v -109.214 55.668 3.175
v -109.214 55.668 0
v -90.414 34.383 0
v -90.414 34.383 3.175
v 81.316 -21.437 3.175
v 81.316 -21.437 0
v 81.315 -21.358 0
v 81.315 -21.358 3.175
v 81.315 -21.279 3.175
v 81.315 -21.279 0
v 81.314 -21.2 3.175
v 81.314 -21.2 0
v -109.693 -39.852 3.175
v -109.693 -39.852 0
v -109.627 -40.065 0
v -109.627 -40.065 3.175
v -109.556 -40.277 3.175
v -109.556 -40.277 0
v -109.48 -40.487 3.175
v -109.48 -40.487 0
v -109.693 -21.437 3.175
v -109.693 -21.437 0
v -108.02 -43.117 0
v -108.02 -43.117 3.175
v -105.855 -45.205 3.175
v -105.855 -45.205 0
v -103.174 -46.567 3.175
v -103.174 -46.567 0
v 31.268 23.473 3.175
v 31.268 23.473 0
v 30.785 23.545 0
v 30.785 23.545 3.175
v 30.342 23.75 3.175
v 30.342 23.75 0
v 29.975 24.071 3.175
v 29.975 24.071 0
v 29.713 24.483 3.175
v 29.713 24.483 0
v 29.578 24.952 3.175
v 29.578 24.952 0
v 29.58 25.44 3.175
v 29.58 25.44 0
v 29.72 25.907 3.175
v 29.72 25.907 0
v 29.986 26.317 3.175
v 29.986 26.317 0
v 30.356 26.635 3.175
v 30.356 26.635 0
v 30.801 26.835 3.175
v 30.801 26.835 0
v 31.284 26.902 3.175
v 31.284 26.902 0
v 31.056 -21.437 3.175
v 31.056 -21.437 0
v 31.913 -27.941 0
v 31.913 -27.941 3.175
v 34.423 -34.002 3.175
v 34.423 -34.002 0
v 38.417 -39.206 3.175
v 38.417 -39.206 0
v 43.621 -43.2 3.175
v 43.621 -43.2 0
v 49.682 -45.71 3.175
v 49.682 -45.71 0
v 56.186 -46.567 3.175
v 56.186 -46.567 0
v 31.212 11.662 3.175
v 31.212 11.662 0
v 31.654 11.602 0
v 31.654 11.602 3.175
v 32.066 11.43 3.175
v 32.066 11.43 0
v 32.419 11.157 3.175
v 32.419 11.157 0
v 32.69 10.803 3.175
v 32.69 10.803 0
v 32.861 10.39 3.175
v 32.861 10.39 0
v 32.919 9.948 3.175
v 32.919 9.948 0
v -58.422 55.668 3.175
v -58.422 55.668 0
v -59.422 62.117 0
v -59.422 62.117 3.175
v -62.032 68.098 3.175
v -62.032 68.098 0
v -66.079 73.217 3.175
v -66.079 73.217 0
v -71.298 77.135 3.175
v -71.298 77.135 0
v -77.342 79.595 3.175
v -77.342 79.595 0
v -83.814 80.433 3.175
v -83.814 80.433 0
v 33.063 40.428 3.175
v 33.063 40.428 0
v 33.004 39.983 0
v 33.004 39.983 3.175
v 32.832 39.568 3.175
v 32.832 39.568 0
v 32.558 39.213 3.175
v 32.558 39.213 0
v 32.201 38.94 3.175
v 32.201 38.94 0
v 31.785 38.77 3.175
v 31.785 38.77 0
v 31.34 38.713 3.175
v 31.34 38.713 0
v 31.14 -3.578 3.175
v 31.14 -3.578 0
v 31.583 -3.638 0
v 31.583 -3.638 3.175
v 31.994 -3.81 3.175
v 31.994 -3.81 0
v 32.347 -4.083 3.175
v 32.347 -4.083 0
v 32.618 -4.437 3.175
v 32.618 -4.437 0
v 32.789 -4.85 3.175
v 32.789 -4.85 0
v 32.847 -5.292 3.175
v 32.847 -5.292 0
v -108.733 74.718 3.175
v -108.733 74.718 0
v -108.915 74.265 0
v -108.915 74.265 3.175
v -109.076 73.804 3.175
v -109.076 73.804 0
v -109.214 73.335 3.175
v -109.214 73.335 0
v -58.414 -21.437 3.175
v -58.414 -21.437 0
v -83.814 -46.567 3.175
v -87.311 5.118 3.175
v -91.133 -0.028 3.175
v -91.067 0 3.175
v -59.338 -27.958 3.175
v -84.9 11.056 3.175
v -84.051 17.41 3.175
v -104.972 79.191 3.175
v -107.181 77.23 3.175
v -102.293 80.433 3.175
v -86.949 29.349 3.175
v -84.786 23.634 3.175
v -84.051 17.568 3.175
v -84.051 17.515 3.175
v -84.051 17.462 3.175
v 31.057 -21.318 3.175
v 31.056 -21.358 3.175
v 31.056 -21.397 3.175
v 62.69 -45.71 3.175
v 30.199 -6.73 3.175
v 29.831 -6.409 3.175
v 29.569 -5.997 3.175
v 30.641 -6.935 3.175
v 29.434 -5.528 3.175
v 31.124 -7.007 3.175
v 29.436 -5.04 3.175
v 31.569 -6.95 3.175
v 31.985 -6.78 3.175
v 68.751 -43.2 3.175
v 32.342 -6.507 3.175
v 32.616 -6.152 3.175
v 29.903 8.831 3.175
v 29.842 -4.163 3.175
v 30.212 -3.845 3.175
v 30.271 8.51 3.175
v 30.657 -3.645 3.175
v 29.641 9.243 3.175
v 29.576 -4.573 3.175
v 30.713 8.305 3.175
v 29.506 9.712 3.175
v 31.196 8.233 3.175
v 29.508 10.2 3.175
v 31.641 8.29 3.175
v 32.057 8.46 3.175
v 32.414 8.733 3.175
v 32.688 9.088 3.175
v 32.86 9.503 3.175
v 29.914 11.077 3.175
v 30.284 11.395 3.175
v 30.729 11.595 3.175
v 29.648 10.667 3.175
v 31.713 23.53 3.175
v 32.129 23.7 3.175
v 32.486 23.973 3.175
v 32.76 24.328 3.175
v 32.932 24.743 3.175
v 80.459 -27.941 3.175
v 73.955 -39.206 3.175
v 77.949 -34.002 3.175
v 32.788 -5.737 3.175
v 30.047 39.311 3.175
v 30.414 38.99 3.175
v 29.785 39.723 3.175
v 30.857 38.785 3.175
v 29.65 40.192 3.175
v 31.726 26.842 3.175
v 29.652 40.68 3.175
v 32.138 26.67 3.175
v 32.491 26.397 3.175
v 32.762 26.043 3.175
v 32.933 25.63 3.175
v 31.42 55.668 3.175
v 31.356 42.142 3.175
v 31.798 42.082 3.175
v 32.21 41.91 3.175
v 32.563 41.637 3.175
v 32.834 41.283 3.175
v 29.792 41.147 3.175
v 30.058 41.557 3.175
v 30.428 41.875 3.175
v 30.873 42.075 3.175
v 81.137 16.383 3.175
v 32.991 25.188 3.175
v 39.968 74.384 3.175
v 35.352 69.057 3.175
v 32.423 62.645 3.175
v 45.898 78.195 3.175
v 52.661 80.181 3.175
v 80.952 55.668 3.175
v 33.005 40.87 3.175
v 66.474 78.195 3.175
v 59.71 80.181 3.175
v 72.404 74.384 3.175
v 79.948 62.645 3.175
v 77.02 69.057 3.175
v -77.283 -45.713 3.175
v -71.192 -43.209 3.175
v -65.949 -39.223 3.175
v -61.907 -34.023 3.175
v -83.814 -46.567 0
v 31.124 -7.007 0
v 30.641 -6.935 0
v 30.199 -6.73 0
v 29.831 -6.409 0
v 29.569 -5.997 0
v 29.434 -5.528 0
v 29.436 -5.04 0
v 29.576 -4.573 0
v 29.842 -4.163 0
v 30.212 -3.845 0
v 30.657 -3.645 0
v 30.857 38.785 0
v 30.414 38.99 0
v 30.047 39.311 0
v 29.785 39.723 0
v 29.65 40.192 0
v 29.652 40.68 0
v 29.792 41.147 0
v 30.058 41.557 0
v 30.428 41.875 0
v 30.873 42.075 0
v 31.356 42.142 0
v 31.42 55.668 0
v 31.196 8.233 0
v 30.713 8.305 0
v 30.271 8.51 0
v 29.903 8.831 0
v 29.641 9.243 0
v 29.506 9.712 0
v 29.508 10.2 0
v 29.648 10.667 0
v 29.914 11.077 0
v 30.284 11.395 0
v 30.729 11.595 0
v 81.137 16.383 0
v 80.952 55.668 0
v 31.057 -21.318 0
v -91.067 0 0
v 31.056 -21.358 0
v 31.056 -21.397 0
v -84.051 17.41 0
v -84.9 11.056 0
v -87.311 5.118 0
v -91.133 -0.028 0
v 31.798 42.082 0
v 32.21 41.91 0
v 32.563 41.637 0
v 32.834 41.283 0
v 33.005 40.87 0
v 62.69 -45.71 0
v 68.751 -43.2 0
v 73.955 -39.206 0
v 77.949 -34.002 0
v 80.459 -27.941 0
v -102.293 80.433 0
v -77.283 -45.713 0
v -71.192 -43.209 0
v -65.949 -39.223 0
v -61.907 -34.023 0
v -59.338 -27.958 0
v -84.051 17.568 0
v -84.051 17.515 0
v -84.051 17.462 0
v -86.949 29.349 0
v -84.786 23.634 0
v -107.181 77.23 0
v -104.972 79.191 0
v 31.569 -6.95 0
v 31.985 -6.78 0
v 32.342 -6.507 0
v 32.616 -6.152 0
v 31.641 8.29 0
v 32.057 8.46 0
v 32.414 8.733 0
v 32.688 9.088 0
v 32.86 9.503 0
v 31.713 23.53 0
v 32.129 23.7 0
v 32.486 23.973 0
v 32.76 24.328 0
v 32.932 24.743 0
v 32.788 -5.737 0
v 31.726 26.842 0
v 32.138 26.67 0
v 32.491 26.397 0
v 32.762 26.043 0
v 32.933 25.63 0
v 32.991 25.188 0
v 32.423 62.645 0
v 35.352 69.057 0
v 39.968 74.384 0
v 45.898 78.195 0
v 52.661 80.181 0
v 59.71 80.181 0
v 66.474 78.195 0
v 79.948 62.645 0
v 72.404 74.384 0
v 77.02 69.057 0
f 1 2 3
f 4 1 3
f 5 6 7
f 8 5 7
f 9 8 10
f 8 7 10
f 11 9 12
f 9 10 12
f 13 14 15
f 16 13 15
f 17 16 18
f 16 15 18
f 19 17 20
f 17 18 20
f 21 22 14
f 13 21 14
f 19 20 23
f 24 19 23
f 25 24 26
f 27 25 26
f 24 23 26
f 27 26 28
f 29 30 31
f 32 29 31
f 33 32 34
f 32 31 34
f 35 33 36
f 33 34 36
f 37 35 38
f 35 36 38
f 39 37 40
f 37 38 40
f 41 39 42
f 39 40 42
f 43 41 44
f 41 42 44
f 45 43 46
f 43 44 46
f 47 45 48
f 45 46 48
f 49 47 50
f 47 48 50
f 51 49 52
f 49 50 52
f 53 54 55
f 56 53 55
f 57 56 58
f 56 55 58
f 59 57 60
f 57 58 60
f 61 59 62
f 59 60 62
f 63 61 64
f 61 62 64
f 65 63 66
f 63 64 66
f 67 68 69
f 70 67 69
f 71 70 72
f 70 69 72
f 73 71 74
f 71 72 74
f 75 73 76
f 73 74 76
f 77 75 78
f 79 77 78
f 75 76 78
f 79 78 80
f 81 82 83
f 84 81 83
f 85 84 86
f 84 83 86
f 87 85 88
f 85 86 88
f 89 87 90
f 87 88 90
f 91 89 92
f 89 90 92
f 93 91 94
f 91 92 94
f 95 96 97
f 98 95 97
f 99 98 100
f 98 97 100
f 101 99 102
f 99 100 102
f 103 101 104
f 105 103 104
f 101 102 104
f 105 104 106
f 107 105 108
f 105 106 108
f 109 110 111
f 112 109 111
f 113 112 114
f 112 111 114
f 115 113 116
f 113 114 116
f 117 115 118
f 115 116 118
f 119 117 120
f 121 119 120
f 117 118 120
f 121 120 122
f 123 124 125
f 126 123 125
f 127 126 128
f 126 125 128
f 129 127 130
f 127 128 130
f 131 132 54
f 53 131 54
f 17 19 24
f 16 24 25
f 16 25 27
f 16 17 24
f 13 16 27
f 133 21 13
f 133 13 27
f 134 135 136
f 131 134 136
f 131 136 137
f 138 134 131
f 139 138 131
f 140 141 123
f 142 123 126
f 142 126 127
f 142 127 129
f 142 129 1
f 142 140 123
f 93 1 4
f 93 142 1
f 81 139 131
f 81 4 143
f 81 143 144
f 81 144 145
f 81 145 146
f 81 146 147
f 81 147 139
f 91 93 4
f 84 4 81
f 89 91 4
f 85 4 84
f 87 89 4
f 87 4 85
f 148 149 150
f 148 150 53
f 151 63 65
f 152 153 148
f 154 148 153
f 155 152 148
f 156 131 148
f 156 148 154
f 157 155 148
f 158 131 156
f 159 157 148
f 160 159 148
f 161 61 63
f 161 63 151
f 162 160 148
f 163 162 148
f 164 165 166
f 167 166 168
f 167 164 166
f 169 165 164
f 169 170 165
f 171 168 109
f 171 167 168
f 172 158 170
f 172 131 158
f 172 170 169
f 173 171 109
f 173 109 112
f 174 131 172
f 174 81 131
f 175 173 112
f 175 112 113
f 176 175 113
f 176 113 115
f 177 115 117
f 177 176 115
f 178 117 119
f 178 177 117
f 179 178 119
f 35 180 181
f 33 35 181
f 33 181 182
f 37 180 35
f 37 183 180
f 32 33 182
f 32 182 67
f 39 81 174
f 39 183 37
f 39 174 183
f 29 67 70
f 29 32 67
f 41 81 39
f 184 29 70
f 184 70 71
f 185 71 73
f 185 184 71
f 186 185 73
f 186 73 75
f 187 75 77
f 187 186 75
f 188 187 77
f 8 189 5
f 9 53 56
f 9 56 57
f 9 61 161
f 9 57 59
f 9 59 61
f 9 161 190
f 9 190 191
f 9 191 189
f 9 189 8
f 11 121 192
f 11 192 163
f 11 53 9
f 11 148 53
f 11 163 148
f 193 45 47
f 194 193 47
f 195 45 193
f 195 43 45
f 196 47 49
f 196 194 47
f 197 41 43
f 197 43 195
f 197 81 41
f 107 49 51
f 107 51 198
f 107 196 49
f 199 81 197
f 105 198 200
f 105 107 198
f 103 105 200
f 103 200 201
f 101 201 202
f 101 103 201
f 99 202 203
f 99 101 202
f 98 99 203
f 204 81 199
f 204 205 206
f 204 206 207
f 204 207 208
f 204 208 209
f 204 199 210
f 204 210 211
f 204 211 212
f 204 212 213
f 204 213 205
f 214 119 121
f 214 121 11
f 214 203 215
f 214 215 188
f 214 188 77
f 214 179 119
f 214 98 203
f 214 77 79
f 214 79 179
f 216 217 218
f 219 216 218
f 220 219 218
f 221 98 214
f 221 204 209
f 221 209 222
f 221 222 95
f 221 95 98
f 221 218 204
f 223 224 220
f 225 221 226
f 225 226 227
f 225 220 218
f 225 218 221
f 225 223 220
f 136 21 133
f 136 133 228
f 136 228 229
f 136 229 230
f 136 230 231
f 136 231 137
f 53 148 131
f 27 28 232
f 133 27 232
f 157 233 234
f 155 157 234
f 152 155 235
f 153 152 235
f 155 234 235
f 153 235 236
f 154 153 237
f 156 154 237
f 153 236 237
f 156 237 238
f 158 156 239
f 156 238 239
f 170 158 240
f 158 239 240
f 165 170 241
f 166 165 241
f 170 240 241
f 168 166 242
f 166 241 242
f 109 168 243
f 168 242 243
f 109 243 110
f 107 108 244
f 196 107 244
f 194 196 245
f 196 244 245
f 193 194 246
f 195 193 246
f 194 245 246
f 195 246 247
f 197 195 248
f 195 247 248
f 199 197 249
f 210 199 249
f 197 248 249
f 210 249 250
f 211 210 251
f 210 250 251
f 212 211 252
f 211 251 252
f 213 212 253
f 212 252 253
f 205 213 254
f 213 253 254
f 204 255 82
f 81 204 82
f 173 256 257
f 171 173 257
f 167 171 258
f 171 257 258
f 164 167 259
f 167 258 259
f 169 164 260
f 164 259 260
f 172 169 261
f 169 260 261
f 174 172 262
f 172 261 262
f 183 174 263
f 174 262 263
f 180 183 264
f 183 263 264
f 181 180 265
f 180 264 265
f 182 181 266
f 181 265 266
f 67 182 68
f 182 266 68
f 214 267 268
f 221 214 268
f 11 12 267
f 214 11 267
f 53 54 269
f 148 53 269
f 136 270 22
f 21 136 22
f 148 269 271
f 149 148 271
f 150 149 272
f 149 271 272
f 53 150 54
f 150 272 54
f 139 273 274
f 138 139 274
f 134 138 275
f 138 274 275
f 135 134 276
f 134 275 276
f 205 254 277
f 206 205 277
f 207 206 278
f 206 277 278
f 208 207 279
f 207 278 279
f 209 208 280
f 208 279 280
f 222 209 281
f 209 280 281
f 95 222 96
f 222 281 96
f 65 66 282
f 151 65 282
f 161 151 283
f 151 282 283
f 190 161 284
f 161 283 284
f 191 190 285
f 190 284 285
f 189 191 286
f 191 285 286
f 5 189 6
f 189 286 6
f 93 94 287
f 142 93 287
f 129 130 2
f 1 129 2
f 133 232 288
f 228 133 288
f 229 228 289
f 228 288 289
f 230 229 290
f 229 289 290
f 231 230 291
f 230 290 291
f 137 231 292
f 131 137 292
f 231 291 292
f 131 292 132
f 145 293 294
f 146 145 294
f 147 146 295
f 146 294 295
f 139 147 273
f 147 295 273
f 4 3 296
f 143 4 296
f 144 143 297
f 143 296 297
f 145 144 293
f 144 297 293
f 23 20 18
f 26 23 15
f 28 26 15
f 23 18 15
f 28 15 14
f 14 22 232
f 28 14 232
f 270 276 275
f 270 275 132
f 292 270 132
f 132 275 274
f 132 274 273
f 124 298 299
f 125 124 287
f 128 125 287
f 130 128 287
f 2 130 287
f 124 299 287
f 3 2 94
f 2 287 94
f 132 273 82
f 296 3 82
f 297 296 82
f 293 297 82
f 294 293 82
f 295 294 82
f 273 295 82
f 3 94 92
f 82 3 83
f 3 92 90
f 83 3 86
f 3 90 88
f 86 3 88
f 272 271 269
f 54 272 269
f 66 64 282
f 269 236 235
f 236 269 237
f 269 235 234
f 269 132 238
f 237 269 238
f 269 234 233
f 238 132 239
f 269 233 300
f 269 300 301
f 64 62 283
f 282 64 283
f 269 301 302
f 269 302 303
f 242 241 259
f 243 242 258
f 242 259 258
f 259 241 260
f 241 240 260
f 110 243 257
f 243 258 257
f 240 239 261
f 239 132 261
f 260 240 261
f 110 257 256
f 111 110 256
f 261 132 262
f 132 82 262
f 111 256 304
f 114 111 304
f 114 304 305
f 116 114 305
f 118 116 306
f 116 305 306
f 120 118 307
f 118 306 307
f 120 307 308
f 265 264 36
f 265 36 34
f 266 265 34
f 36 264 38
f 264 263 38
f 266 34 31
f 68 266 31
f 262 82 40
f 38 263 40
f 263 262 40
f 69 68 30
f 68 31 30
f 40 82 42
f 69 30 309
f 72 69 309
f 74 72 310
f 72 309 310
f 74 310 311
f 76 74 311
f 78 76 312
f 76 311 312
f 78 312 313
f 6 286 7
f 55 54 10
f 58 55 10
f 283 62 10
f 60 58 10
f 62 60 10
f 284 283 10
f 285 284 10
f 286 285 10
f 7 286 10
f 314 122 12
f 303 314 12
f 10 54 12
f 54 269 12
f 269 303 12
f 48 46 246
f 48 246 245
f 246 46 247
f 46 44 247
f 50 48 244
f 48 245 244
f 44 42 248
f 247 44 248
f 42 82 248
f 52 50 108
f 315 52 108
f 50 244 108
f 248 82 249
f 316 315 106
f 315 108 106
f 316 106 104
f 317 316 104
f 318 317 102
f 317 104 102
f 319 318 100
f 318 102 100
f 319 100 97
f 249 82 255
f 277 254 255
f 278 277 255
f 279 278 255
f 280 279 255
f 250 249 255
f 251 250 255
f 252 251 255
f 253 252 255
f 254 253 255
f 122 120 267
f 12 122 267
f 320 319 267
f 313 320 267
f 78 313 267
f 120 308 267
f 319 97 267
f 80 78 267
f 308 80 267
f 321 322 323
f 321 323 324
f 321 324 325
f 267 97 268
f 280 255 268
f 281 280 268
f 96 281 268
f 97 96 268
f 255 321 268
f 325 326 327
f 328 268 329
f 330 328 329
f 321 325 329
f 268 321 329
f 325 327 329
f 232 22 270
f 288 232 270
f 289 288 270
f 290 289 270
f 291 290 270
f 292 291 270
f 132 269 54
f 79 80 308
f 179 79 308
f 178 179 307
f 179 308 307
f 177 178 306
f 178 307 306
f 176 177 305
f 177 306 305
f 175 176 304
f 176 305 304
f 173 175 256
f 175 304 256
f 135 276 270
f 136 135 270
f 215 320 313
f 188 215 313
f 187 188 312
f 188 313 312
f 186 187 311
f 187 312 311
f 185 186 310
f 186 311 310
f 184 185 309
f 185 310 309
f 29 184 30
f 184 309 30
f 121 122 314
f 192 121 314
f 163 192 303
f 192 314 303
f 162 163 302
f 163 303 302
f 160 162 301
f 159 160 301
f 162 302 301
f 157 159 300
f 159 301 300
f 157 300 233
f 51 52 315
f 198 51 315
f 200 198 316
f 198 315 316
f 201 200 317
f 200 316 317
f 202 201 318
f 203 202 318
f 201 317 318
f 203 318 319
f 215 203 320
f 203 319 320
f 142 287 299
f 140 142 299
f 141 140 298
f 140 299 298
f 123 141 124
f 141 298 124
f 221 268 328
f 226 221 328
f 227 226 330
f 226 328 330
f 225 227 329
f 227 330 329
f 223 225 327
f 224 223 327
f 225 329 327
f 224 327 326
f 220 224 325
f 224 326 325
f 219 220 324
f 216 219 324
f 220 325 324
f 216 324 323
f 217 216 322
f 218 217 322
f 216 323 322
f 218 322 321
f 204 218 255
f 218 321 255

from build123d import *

# Parameters (mm, degrees)
F1_DEPTH = 3.175


# Not quite as in the source:
# - a length typed as a fraction of an inch, garbled in the dataset ("3 / 203.2 mm" for 3/8 in), is restored
# - a feature names something its author has since deleted; it is built from what else it names


with BuildPart() as f1:
    # F0 (on Top) → F1 (new body)
    with BuildSketch(Plane.XY):
        with BuildLine():
            Line((-58.4220365395, 55.6676574051), (-83.8141146934, 55.6676574051))
            Line((-83.8141146934, 55.6676574051), (-83.8141146934, 17.4082663185))
            Line((-83.8141146934, 17.4082663185), (-54.5982423949, 17.2266236973))
            ThreePointArc((-54.5982423949, 17.2266236973), (-52.878445863, 18.9304561303), (-51.1692755304, 17.2159644142))
            ThreePointArc((-51.1692755304, 17.2159644142), (-51.1692838142, 17.2106347468), (-51.1693086658, 17.205305131))
            Line((-51.1693086658, 17.205305131), (-48.1096365395, 17.1862823595))
            Line((-48.1096365395, 17.1862823595), (-48.1096365395, 55.6676574051))
            Line((-48.1096365395, 55.6676574051), (-51.9196365395, 55.6676574051))
            Line((-51.9196365395, 55.6676574051), (-58.4220365395, 55.6676574051))
        make_face()
        with BuildLine():
            Line((-83.8141146934, 80.4333333333), (-83.8141146934, 55.6676574051))
            Line((-83.8141146934, 55.6676574051), (-58.4220365395, 55.6676574051))
            ThreePointArc((-58.4220365395, 55.6676574051), (-66.0792878183, 73.2167300378), (-83.8141146934, 80.4333333333))
        make_face()
        with BuildLine():
            Line((-96.5141146934, 55.6676574051), (-83.8141146934, 55.6676574051))
            Line((-83.8141146934, 55.6676574051), (-83.8141146934, 80.4333333333))
            Line((-83.8141146934, 80.4333333333), (-96.5141146934, 80.4333333333))
            Line((-96.5141146934, 80.4333333333), (-102.2933936502, 80.4333333333))
            ThreePointArc((-102.2933936502, 80.4333333333), (-106.1483818555, 78.2913178986), (-108.7325867358, 74.7176574051))
            Line((-108.7325867358, 74.7176574051), (-102.8641146934, 74.7176574051))
            Line((-102.8641146934, 74.7176574051), (-99.6891146934, 74.7176574051))
            Line((-99.6891146934, 74.7176574051), (-99.6891146934, 55.6676574051))
            Line((-99.6891146934, 55.6676574051), (-96.5141146934, 55.6676574051))
        make_face()
        with BuildLine():
            Line((-83.8141146934, 17.4082663185), (-83.8141146934, 55.6676574051))
            Line((-83.8141146934, 55.6676574051), (-96.5141146934, 55.6676574051))
            Line((-96.5141146934, 55.6676574051), (-99.6891146934, 55.6676574051))
            Line((-99.6891146934, 55.6676574051), (-102.8641146934, 55.6676574051))
            Line((-102.8641146934, 55.6676574051), (-109.2141146934, 55.6676574051))
            Line((-109.2141146934, 55.6676574051), (-90.4137483739, 34.3826312783))
            ThreePointArc((-90.4137483739, 34.3826312783), (-85.6948772916, 26.5569289565), (-84.0509922302, 17.5676574051))
            ThreePointArc((-84.0509922302, 17.5676574051), (-84.0511149543, 17.4886993707), (-84.0514831256, 17.4097420993))
            Line((-84.0514831256, 17.4097420993), (-83.8141146934, 17.4082663185))
        make_face()
        with BuildLine():
            Line((-54.5982423949, 17.2266236973), (-83.8141146934, 17.4082663185))
            Line((-83.8141146934, 17.4082663185), (-83.8141146934, -21.4370436153))
            Line((-83.8141146934, -21.4370436153), (-58.4141146934, -21.4370436153))
            Line((-58.4141146934, -21.4370436153), (-48.1096365395, -21.4370436153))
            Line((-48.1096365395, -21.4370436153), (-48.1096365395, 17.1862823595))
            Line((-48.1096365395, 17.1862823595), (-51.1693086658, 17.205305131))
            ThreePointArc((-51.1693086658, 17.205305131), (-52.8944348135, 15.5014975496), (-54.5982423949, 17.2266236973))
        make_face()
        with BuildLine():
            Line((-83.8141146934, -21.4370436153), (-83.8141146934, 17.4082663185))
            Line((-83.8141146934, 17.4082663185), (-84.0514831256, 17.4097420993))
            ThreePointArc((-84.0514831256, 17.4097420993), (-85.9174728188, 8.0108031049), (-91.1328551507, -0.0279629004))
            Line((-91.1328551507, -0.0279629004), (-91.0666517454, 0))
            Line((-91.0666517454, 0), (-109.6934945268, -21.4370436153))
            Line((-109.6934945268, -21.4370436153), (-103.5974945268, -21.4370436153))
            Line((-103.5974945268, -21.4370436153), (-100.1684945268, -21.4370436153))
            Line((-100.1684945268, -21.4370436153), (-83.8141146934, -21.4370436153))
        make_face()
        with BuildLine():
            Line((-58.4141146934, -21.4370436153), (-83.8141146934, -21.4370436153))
            Line((-83.8141146934, -21.4370436153), (-83.8141146934, -46.5666666667))
            ThreePointArc((-83.8141146934, -46.5666666667), (-65.9485232906, -39.2230246493), (-58.4141146934, -21.4370436153))
        make_face()
        with BuildLine():
            Line((-83.8141146934, -46.5666666667), (-83.8141146934, -21.4370436153))
            Line((-83.8141146934, -21.4370436153), (-100.1684945268, -21.4370436153))
            Line((-100.1684945268, -21.4370436153), (-100.1684945268, -40.4870436153))
            Line((-100.1684945268, -40.4870436153), (-103.5974945268, -40.4870436153))
            Line((-103.5974945268, -40.4870436153), (-109.4795895949, -40.4870436153))
            ThreePointArc((-109.4795895949, -40.4870436153), (-107.0154315461, -44.2413370786), (-103.1736042979, -46.5666666667))
            Line((-103.1736042979, -46.5666666667), (-96.7538046101, -46.5666666667))
            Line((-96.7538046101, -46.5666666667), (-83.8141146934, -46.5666666667))
        make_face()
        with BuildLine():
            ThreePointArc((-51.1692755304, 17.2159644142), (-52.878445863, 18.9304561303), (-54.5982423949, 17.2266236973))
            Line((-54.5982423949, 17.2266236973), (-51.1693086658, 17.205305131))
            ThreePointArc((-51.1693086658, 17.205305131), (-51.1692838142, 17.2106347468), (-51.1692755304, 17.2159644142))
        make_face()
        with BuildLine():
            Line((-51.1693086658, 17.205305131), (-54.5982423949, 17.2266236973))
            ThreePointArc((-54.5982423949, 17.2266236973), (-52.8944348135, 15.5014975496), (-51.1693086658, 17.205305131))
        make_face()
        with BuildLine():
            Line((56.1858853066, 55.6676574051), (56.1858853066, 80.4333333333))
            ThreePointArc((56.1858853066, 80.4333333333), (38.6739079171, 73.1796347946), (31.4202093784, 55.6676574051))
            Line((31.4202093784, 55.6676574051), (56.1858853066, 55.6676574051))
        make_face()
        with BuildLine():
            ThreePointArc((80.9515612348, 55.6676574051), (73.6978626961, 73.1796347946), (56.1858853066, 80.4333333333))
            Line((56.1858853066, 80.4333333333), (56.1858853066, 55.6676574051))
            Line((56.1858853066, 55.6676574051), (80.9515612348, 55.6676574051))
        make_face()
        with BuildLine():
            Line((-102.8641146934, 55.6676574051), (-99.6891146934, 55.6676574051))
            Line((-99.6891146934, 55.6676574051), (-99.6891146934, 74.7176574051))
            Line((-99.6891146934, 74.7176574051), (-102.8641146934, 74.7176574051))
            Line((-102.8641146934, 74.7176574051), (-102.8641146934, 71.6696574051))
            ThreePointArc((-102.8641146934, 71.6696574051), (-101.651780117, 71.1674919815), (-101.1496146934, 69.9551574051))
            ThreePointArc((-101.1496146934, 69.9551574051), (-101.651780117, 68.7428228288), (-102.8641146934, 68.2406574051))
            Line((-102.8641146934, 68.2406574051), (-102.8641146934, 62.1446574051))
            ThreePointArc((-102.8641146934, 62.1446574051), (-101.651780117, 61.6424919815), (-101.1496146934, 60.4301574051))
            ThreePointArc((-101.1496146934, 60.4301574051), (-101.651780117, 59.2178228288), (-102.8641146934, 58.7156574051))
            Line((-102.8641146934, 58.7156574051), (-102.8641146934, 55.6676574051))
        make_face()
        with BuildLine():
            Line((-100.1684945268, -40.4870436153), (-100.1684945268, -21.4370436153))
            Line((-100.1684945268, -21.4370436153), (-103.5974945268, -21.4370436153))
            Line((-103.5974945268, -21.4370436153), (-103.5974945268, -25.4485957723))
            ThreePointArc((-103.5974945268, -25.4485957723), (-102.3851599505, -25.9507611959), (-101.8829945268, -27.1630957723))
            ThreePointArc((-101.8829945268, -27.1630957723), (-102.3851599505, -28.3754303486), (-103.5974945268, -28.8775957723))
            Line((-103.5974945268, -28.8775957723), (-103.5974945268, -32.9818256598))
            ThreePointArc((-103.5974945268, -32.9818256598), (-102.3851599505, -33.4839910834), (-101.8829945268, -34.6963256598))
            ThreePointArc((-101.8829945268, -34.6963256598), (-102.3851599505, -35.9086602361), (-103.5974945268, -36.4108256598))
            Line((-103.5974945268, -36.4108256598), (-103.5974945268, -40.4870436153))
            Line((-103.5974945268, -40.4870436153), (-100.1684945268, -40.4870436153))
        make_face()
        Polygon((-39.2196365395, 55.6676574051), (-48.1096365395, 55.6676574051), (-48.1096365395, 17.1862823595), (-39.2196365395, 17.1310109342), align=None)
        with BuildLine():
            Line((81.1369927167, 16.382722696), (80.9515612348, 55.6676574051))
            ThreePointArc((80.9515612348, 55.6676574051), (73.6978626961, 38.1556800156), (56.1858853066, 30.9019814769))
            Line((56.1858853066, 30.9019814769), (56.1858853066, 26.6474814769))
            ThreePointArc((56.1858853066, 26.6474814769), (57.398219883, 26.1453160533), (57.9003853066, 24.9329814769))
            ThreePointArc((57.9003853066, 24.9329814769), (57.398219883, 23.7206469006), (56.1858853066, 23.2184814769))
            Line((56.1858853066, 23.2184814769), (56.1858853066, 16.5378501727))
            Line((56.1858853066, 16.5378501727), (81.1369927167, 16.382722696))
        make_face()
        with BuildLine():
            ThreePointArc((56.1858853066, 30.9019814769), (73.6978626961, 38.1556800156), (80.9515612348, 55.6676574051))
            Line((80.9515612348, 55.6676574051), (56.1858853066, 55.6676574051))
            Line((56.1858853066, 55.6676574051), (56.1858853066, 30.9019814769))
        make_face()
        with BuildLine():
            Line((31.35631828, 42.1423083088), (31.4202093784, 55.6676574051))
            Line((31.4202093784, 55.6676574051), (24.2803634605, 55.6676574051))
            Line((24.2803634605, 55.6676574051), (20.4703634605, 55.6676574051))
            Line((20.4703634605, 55.6676574051), (20.4703634605, 16.7599027932))
            Line((20.4703634605, 16.7599027932), (23.5155513145, 16.7409700741))
            ThreePointArc((23.5155513145, 16.7409700741), (25.2353478464, 18.4448025071), (26.944518179, 16.730310791))
            ThreePointArc((26.944518179, 16.730310791), (26.9445098952, 16.7249811236), (26.9444850436, 16.7196515078))
            Line((26.9444850436, 16.7196515078), (31.2361005906, 16.6929694259))
            Line((31.2361005906, 16.6929694259), (31.2681297634, 23.4733465661))
            ThreePointArc((31.2681297634, 23.4733465661), (29.5617477636, 25.1959263091), (31.2843275066, 26.9023083088))
            Line((31.2843275066, 26.9023083088), (31.3401205367, 38.7133465661))
            ThreePointArc((31.3401205367, 38.7133465661), (29.633738537, 40.4359263091), (31.35631828, 42.1423083088))
        make_face()
        with BuildLine():
            Line((56.1858853066, 55.6676574051), (31.4202093784, 55.6676574051))
            ThreePointArc((31.4202093784, 55.6676574051), (38.6739079171, 38.1556800156), (56.1858853066, 30.9019814769))
            Line((56.1858853066, 30.9019814769), (56.1858853066, 55.6676574051))
        make_face()
        with BuildLine():
            ThreePointArc((56.1858853066, 30.9019814769), (38.6739079171, 38.1556800156), (31.4202093784, 55.6676574051))
            Line((31.4202093784, 55.6676574051), (31.35631828, 42.1423083088))
            ThreePointArc((31.35631828, 42.1423083088), (32.5634139947, 41.6372952408), (33.0627194083, 40.4278274374))
            ThreePointArc((33.0627194083, 40.4278274374), (32.5576872116, 39.2126328511), (31.3401205367, 38.7133465661))
            Line((31.3401205367, 38.7133465661), (31.2843275066, 26.9023083088))
            ThreePointArc((31.2843275066, 26.9023083088), (32.4914232214, 26.3972952408), (32.990728635, 25.1878274374))
            ThreePointArc((32.990728635, 25.1878274374), (32.4856964383, 23.9726328511), (31.2681297634, 23.4733465661))
            Line((31.2681297634, 23.4733465661), (31.2361005906, 16.6929694259))
            Line((31.2361005906, 16.6929694259), (56.1858853066, 16.5378501727))
            Line((56.1858853066, 16.5378501727), (56.1858853066, 23.2184814769))
            ThreePointArc((56.1858853066, 23.2184814769), (54.4713853066, 24.9329814769), (56.1858853066, 26.6474814769))
            Line((56.1858853066, 26.6474814769), (56.1858853066, 30.9019814769))
        make_face()
        with BuildLine():
            Line((-109.2141146934, 55.6676574051), (-102.8641146934, 55.6676574051))
            Line((-102.8641146934, 55.6676574051), (-102.8641146934, 58.7156574051))
            ThreePointArc((-102.8641146934, 58.7156574051), (-104.5786146934, 60.4301574051), (-102.8641146934, 62.1446574051))
            Line((-102.8641146934, 62.1446574051), (-102.8641146934, 68.2406574051))
            ThreePointArc((-102.8641146934, 68.2406574051), (-104.5786146934, 69.9551574051), (-102.8641146934, 71.6696574051))
            Line((-102.8641146934, 71.6696574051), (-102.8641146934, 74.7176574051))
            Line((-102.8641146934, 74.7176574051), (-108.7325867358, 74.7176574051))
            ThreePointArc((-108.7325867358, 74.7176574051), (-108.9982771043, 74.0351876591), (-109.2141146934, 73.3353516345))
            Line((-109.2141146934, 73.3353516345), (-109.2141146934, 68.0504953692))
            Line((-109.2141146934, 68.0504953692), (-109.2141146934, 55.6676574051))
        make_face()
        Polygon((-48.1096365395, 17.1862823595), (-48.1096365395, -21.4370436153), (-39.2196365395, -21.4370436153), (-39.2196365395, 17.1310109342), align=None)
        with BuildLine():
            Line((-103.5974945268, -25.4485957723), (-103.5974945268, -21.4370436153))
            Line((-103.5974945268, -21.4370436153), (-109.6934945268, -21.4370436153))
            Line((-109.6934945268, -21.4370436153), (-109.6934945268, -34.001855141))
            Line((-109.6934945268, -34.001855141), (-109.6934945268, -39.8522517564))
            ThreePointArc((-109.6934945268, -39.8522517564), (-109.5917750698, -40.1714110456), (-109.4795895949, -40.4870436153))
            Line((-109.4795895949, -40.4870436153), (-103.5974945268, -40.4870436153))
            Line((-103.5974945268, -40.4870436153), (-103.5974945268, -36.4108256598))
            ThreePointArc((-103.5974945268, -36.4108256598), (-105.3119945268, -34.6963256598), (-103.5974945268, -32.9818256598))
            Line((-103.5974945268, -32.9818256598), (-103.5974945268, -28.8775957723))
            ThreePointArc((-103.5974945268, -28.8775957723), (-105.3119945268, -27.1630957723), (-103.5974945268, -25.4485957723))
        make_face()
        with BuildLine():
            Line((11.5803634605, 55.6676574051), (-39.2196365395, 55.6676574051))
            Line((-39.2196365395, 55.6676574051), (-39.2196365395, 17.1310109342))
            Line((-39.2196365395, 17.1310109342), (-36.1589034041, 17.1119815661))
            ThreePointArc((-36.1589034041, 17.1119815661), (-34.4391068722, 18.815813999), (-32.7299365395, 17.1013222829))
            ThreePointArc((-32.7299365395, 17.1013222829), (-32.7299448234, 17.0959926156), (-32.729969675, 17.0906629998))
            Line((-32.729969675, 17.0906629998), (5.0906965959, 16.8555221529))
            ThreePointArc((5.0906965959, 16.8555221529), (6.8104931278, 18.5593545859), (8.5196634605, 16.8448628697))
            ThreePointArc((8.5196634605, 16.8448628697), (8.5196551766, 16.8395332024), (8.519630325, 16.8342035866))
            Line((8.519630325, 16.8342035866), (11.5803634605, 16.8151742185))
            Line((11.5803634605, 16.8151742185), (11.5803634605, 55.6676574051))
        make_face()
        with BuildLine():
            Line((81.3143886077, -21.1998168282), (81.1369927167, 16.382722696))
            Line((81.1369927167, 16.382722696), (56.1858853066, 16.5378501727))
            Line((56.1858853066, 16.5378501727), (56.1858853066, 13.1854814769))
            ThreePointArc((56.1858853066, 13.1854814769), (57.398219883, 12.6833160533), (57.9003853066, 11.4709814769))
            ThreePointArc((57.9003853066, 11.4709814769), (57.398219883, 10.2586469006), (56.1858853066, 9.7564814769))
            Line((56.1858853066, 9.7564814769), (56.1858853066, 3.692579436))
            ThreePointArc((56.1858853066, 3.692579436), (73.8711409588, -3.5840414247), (81.3143886077, -21.1998168282))
        make_face()
        with BuildLine():
            ThreePointArc((-102.8641146934, 62.1446574051), (-104.5786146934, 60.4301574051), (-102.8641146934, 58.7156574051))
            Line((-102.8641146934, 58.7156574051), (-102.8641146934, 62.1446574051))
        make_face()
        with BuildLine():
            Line((-102.8641146934, 62.1446574051), (-102.8641146934, 58.7156574051))
            ThreePointArc((-102.8641146934, 58.7156574051), (-101.651780117, 59.2178228288), (-101.1496146934, 60.4301574051))
            ThreePointArc((-101.1496146934, 60.4301574051), (-101.651780117, 61.6424919815), (-102.8641146934, 62.1446574051))
        make_face()
        with BuildLine():
            Line((-39.2196365395, 17.1310109342), (-39.2196365395, -21.4370436153))
            Line((-39.2196365395, -21.4370436153), (11.5803634605, -21.4370436153))
            Line((11.5803634605, -21.4370436153), (11.5803634605, 16.8151742185))
            Line((11.5803634605, 16.8151742185), (8.519630325, 16.8342035866))
            ThreePointArc((8.519630325, 16.8342035866), (6.7945041773, 15.1303960052), (5.0906965959, 16.8555221529))
            Line((5.0906965959, 16.8555221529), (-32.729969675, 17.0906629998))
            ThreePointArc((-32.729969675, 17.0906629998), (-34.4550958227, 15.3868554184), (-36.1589034041, 17.1119815661))
            Line((-36.1589034041, 17.1119815661), (-39.2196365395, 17.1310109342))
        make_face()
        with BuildLine():
            Line((56.1858853066, -21.4370436153), (56.1858853066, -46.5666666667))
            ThreePointArc((56.1858853066, -46.5666666667), (73.9552121749, -39.2063704836), (81.315508358, -21.4370436153))
            Line((81.315508358, -21.4370436153), (56.1858853066, -21.4370436153))
        make_face()
        with BuildLine():
            ThreePointArc((31.0562622553, -21.4370436153), (38.4165584384, -39.2063704836), (56.1858853066, -46.5666666667))
            Line((56.1858853066, -46.5666666667), (56.1858853066, -21.4370436153))
            Line((56.1858853066, -21.4370436153), (31.0562622553, -21.4370436153))
        make_face()
        with BuildLine():
            ThreePointArc((-101.8829945268, -27.1630957723), (-102.3851599505, -25.9507611959), (-103.5974945268, -25.4485957723))
            Line((-103.5974945268, -25.4485957723), (-103.5974945268, -28.8775957723))
            ThreePointArc((-103.5974945268, -28.8775957723), (-102.3851599505, -28.3754303486), (-101.8829945268, -27.1630957723))
        make_face()
        with BuildLine():
            Line((-103.5974945268, -28.8775957723), (-103.5974945268, -25.4485957723))
            ThreePointArc((-103.5974945268, -25.4485957723), (-105.3119945268, -27.1630957723), (-103.5974945268, -28.8775957723))
        make_face()
        Polygon((20.4703634605, 55.6676574051), (11.5803634605, 55.6676574051), (11.5803634605, 16.8151742185), (20.4703634605, 16.7599027932), align=None)
        with BuildLine():
            ThreePointArc((57.9003853066, 24.9329814769), (57.398219883, 26.1453160533), (56.1858853066, 26.6474814769))
            Line((56.1858853066, 26.6474814769), (56.1858853066, 23.2184814769))
            ThreePointArc((56.1858853066, 23.2184814769), (57.398219883, 23.7206469006), (57.9003853066, 24.9329814769))
        make_face()
        with BuildLine():
            Line((56.1858853066, 23.2184814769), (56.1858853066, 26.6474814769))
            ThreePointArc((56.1858853066, 26.6474814769), (54.4713853066, 24.9329814769), (56.1858853066, 23.2184814769))
        make_face()
        with BuildLine():
            Line((81.315508358, -21.4370436153), (81.3143886077, -21.1998168282))
            ThreePointArc((81.3143886077, -21.1998168282), (73.8711409588, -3.5840414247), (56.1858853066, 3.692579436))
            Line((56.1858853066, 3.692579436), (56.1858853066, -21.4370436153))
            Line((56.1858853066, -21.4370436153), (81.315508358, -21.4370436153))
        make_face()
        with BuildLine():
            ThreePointArc((81.315508358, -21.4370436153), (81.3152284188, -21.3184289004), (81.3143886077, -21.1998168282))
            Line((81.3143886077, -21.1998168282), (81.315508358, -21.4370436153))
        make_face()
        with BuildLine():
            Line((56.1858853066, 13.1854814769), (56.1858853066, 16.5378501727))
            Line((56.1858853066, 16.5378501727), (31.2361005906, 16.6929694259))
            Line((31.2361005906, 16.6929694259), (31.2123367333, 11.6623083088))
            ThreePointArc((31.2123367333, 11.6623083088), (32.4194324481, 11.1572952408), (32.9187378617, 9.9478274374))
            ThreePointArc((32.9187378617, 9.9478274374), (32.413705665, 8.7326328511), (31.1961389901, 8.2333465661))
            Line((31.1961389901, 8.2333465661), (31.14034596, -3.5776916912))
            ThreePointArc((31.14034596, -3.5776916912), (32.3474416748, -4.0827047592), (32.8467470884, -5.2921725626))
            ThreePointArc((32.8467470884, -5.2921725626), (32.3417148917, -6.5073671489), (31.1241482168, -7.0066534339))
            Line((31.1241482168, -7.0066534339), (31.0565426242, -21.3183378707))
            ThreePointArc((31.0565426242, -21.3183378707), (38.4585769367, -3.6257973743), (56.1858853066, 3.692579436))
            Line((56.1858853066, 3.692579436), (56.1858853066, 9.7564814769))
            ThreePointArc((56.1858853066, 9.7564814769), (54.4713853066, 11.4709814769), (56.1858853066, 13.1854814769))
        make_face()
        with BuildLine():
            ThreePointArc((-101.1496146934, 69.9551574051), (-101.651780117, 71.1674919815), (-102.8641146934, 71.6696574051))
            Line((-102.8641146934, 71.6696574051), (-102.8641146934, 68.2406574051))
            ThreePointArc((-102.8641146934, 68.2406574051), (-101.651780117, 68.7428228288), (-101.1496146934, 69.9551574051))
        make_face()
        with BuildLine():
            Line((-102.8641146934, 68.2406574051), (-102.8641146934, 71.6696574051))
            ThreePointArc((-102.8641146934, 71.6696574051), (-104.5786146934, 69.9551574051), (-102.8641146934, 68.2406574051))
        make_face()
        Polygon((11.5803634605, 16.8151742185), (11.5803634605, -21.4370436153), (20.4703634605, -21.4370436153), (20.4703634605, 16.7599027932), align=None)
        with BuildLine():
            ThreePointArc((31.0565426242, -21.3183378707), (31.0563323476, -21.3776905775), (31.0562622553, -21.4370436153))
            Line((31.0562622553, -21.4370436153), (56.1858853066, -21.4370436153))
            Line((56.1858853066, -21.4370436153), (56.1858853066, 3.692579436))
            ThreePointArc((56.1858853066, 3.692579436), (38.4585769367, -3.6257973743), (31.0565426242, -21.3183378707))
        make_face()
        with BuildLine():
            ThreePointArc((-103.5974945268, -32.9818256598), (-105.3119945268, -34.6963256598), (-103.5974945268, -36.4108256598))
            Line((-103.5974945268, -36.4108256598), (-103.5974945268, -32.9818256598))
        make_face()
        with BuildLine():
            Line((-103.5974945268, -32.9818256598), (-103.5974945268, -36.4108256598))
            ThreePointArc((-103.5974945268, -36.4108256598), (-102.3851599505, -35.9086602361), (-101.8829945268, -34.6963256598))
            ThreePointArc((-101.8829945268, -34.6963256598), (-102.3851599505, -33.4839910834), (-103.5974945268, -32.9818256598))
        make_face()
        with BuildLine():
            ThreePointArc((-32.7299365395, 17.1013222829), (-34.4391068722, 18.815813999), (-36.1589034041, 17.1119815661))
            Line((-36.1589034041, 17.1119815661), (-32.729969675, 17.0906629998))
            ThreePointArc((-32.729969675, 17.0906629998), (-32.7299448234, 17.0959926156), (-32.7299365395, 17.1013222829))
        make_face()
        with BuildLine():
            Line((-32.729969675, 17.0906629998), (-36.1589034041, 17.1119815661))
            ThreePointArc((-36.1589034041, 17.1119815661), (-34.4550958227, 15.3868554184), (-32.729969675, 17.0906629998))
        make_face()
        with BuildLine():
            ThreePointArc((57.9003853066, 11.4709814769), (57.398219883, 12.6833160533), (56.1858853066, 13.1854814769))
            Line((56.1858853066, 13.1854814769), (56.1858853066, 9.7564814769))
            ThreePointArc((56.1858853066, 9.7564814769), (57.398219883, 10.2586469006), (57.9003853066, 11.4709814769))
        make_face()
        with BuildLine():
            Line((56.1858853066, 9.7564814769), (56.1858853066, 13.1854814769))
            ThreePointArc((56.1858853066, 13.1854814769), (54.4713853066, 11.4709814769), (56.1858853066, 9.7564814769))
        make_face()
        with BuildLine():
            Line((31.2123367333, 11.6623083088), (31.2361005906, 16.6929694259))
            Line((31.2361005906, 16.6929694259), (26.9444850436, 16.7196515078))
            ThreePointArc((26.9444850436, 16.7196515078), (25.2193588959, 15.0158439264), (23.5155513145, 16.7409700741))
            Line((23.5155513145, 16.7409700741), (20.4703634605, 16.7599027932))
            Line((20.4703634605, 16.7599027932), (20.4703634605, -21.4370436153))
            Line((20.4703634605, -21.4370436153), (31.0559818816, -21.4370436153))
            Line((31.0559818816, -21.4370436153), (31.0565426242, -21.3183378707))
            Line((31.0565426242, -21.3183378707), (31.1241482168, -7.0066534339))
            ThreePointArc((31.1241482168, -7.0066534339), (29.417766217, -5.2840736909), (31.14034596, -3.5776916912))
            Line((31.14034596, -3.5776916912), (31.1961389901, 8.2333465661))
            ThreePointArc((31.1961389901, 8.2333465661), (29.4897569903, 9.9559263091), (31.2123367333, 11.6623083088))
        make_face()
        with BuildLine():
            ThreePointArc((5.0906965959, 16.8555221529), (6.7945041773, 15.1303960052), (8.519630325, 16.8342035866))
            Line((8.519630325, 16.8342035866), (5.0906965959, 16.8555221529))
        make_face()
        with BuildLine():
            Line((5.0906965959, 16.8555221529), (8.519630325, 16.8342035866))
            ThreePointArc((8.519630325, 16.8342035866), (8.5196551766, 16.8395332024), (8.5196634605, 16.8448628697))
            ThreePointArc((8.5196634605, 16.8448628697), (6.8104931278, 18.5593545859), (5.0906965959, 16.8555221529))
        make_face()
        with BuildLine():
            ThreePointArc((23.5155513145, 16.7409700741), (25.2193588959, 15.0158439264), (26.9444850436, 16.7196515078))
            Line((26.9444850436, 16.7196515078), (23.5155513145, 16.7409700741))
        make_face()
        with BuildLine():
            Line((23.5155513145, 16.7409700741), (26.9444850436, 16.7196515078))
            ThreePointArc((26.9444850436, 16.7196515078), (26.9445098952, 16.7249811236), (26.944518179, 16.730310791))
            ThreePointArc((26.944518179, 16.730310791), (25.2353478464, 18.4448025071), (23.5155513145, 16.7409700741))
        make_face()
    extrude(amount=F1_DEPTH)


solid = f1.part
